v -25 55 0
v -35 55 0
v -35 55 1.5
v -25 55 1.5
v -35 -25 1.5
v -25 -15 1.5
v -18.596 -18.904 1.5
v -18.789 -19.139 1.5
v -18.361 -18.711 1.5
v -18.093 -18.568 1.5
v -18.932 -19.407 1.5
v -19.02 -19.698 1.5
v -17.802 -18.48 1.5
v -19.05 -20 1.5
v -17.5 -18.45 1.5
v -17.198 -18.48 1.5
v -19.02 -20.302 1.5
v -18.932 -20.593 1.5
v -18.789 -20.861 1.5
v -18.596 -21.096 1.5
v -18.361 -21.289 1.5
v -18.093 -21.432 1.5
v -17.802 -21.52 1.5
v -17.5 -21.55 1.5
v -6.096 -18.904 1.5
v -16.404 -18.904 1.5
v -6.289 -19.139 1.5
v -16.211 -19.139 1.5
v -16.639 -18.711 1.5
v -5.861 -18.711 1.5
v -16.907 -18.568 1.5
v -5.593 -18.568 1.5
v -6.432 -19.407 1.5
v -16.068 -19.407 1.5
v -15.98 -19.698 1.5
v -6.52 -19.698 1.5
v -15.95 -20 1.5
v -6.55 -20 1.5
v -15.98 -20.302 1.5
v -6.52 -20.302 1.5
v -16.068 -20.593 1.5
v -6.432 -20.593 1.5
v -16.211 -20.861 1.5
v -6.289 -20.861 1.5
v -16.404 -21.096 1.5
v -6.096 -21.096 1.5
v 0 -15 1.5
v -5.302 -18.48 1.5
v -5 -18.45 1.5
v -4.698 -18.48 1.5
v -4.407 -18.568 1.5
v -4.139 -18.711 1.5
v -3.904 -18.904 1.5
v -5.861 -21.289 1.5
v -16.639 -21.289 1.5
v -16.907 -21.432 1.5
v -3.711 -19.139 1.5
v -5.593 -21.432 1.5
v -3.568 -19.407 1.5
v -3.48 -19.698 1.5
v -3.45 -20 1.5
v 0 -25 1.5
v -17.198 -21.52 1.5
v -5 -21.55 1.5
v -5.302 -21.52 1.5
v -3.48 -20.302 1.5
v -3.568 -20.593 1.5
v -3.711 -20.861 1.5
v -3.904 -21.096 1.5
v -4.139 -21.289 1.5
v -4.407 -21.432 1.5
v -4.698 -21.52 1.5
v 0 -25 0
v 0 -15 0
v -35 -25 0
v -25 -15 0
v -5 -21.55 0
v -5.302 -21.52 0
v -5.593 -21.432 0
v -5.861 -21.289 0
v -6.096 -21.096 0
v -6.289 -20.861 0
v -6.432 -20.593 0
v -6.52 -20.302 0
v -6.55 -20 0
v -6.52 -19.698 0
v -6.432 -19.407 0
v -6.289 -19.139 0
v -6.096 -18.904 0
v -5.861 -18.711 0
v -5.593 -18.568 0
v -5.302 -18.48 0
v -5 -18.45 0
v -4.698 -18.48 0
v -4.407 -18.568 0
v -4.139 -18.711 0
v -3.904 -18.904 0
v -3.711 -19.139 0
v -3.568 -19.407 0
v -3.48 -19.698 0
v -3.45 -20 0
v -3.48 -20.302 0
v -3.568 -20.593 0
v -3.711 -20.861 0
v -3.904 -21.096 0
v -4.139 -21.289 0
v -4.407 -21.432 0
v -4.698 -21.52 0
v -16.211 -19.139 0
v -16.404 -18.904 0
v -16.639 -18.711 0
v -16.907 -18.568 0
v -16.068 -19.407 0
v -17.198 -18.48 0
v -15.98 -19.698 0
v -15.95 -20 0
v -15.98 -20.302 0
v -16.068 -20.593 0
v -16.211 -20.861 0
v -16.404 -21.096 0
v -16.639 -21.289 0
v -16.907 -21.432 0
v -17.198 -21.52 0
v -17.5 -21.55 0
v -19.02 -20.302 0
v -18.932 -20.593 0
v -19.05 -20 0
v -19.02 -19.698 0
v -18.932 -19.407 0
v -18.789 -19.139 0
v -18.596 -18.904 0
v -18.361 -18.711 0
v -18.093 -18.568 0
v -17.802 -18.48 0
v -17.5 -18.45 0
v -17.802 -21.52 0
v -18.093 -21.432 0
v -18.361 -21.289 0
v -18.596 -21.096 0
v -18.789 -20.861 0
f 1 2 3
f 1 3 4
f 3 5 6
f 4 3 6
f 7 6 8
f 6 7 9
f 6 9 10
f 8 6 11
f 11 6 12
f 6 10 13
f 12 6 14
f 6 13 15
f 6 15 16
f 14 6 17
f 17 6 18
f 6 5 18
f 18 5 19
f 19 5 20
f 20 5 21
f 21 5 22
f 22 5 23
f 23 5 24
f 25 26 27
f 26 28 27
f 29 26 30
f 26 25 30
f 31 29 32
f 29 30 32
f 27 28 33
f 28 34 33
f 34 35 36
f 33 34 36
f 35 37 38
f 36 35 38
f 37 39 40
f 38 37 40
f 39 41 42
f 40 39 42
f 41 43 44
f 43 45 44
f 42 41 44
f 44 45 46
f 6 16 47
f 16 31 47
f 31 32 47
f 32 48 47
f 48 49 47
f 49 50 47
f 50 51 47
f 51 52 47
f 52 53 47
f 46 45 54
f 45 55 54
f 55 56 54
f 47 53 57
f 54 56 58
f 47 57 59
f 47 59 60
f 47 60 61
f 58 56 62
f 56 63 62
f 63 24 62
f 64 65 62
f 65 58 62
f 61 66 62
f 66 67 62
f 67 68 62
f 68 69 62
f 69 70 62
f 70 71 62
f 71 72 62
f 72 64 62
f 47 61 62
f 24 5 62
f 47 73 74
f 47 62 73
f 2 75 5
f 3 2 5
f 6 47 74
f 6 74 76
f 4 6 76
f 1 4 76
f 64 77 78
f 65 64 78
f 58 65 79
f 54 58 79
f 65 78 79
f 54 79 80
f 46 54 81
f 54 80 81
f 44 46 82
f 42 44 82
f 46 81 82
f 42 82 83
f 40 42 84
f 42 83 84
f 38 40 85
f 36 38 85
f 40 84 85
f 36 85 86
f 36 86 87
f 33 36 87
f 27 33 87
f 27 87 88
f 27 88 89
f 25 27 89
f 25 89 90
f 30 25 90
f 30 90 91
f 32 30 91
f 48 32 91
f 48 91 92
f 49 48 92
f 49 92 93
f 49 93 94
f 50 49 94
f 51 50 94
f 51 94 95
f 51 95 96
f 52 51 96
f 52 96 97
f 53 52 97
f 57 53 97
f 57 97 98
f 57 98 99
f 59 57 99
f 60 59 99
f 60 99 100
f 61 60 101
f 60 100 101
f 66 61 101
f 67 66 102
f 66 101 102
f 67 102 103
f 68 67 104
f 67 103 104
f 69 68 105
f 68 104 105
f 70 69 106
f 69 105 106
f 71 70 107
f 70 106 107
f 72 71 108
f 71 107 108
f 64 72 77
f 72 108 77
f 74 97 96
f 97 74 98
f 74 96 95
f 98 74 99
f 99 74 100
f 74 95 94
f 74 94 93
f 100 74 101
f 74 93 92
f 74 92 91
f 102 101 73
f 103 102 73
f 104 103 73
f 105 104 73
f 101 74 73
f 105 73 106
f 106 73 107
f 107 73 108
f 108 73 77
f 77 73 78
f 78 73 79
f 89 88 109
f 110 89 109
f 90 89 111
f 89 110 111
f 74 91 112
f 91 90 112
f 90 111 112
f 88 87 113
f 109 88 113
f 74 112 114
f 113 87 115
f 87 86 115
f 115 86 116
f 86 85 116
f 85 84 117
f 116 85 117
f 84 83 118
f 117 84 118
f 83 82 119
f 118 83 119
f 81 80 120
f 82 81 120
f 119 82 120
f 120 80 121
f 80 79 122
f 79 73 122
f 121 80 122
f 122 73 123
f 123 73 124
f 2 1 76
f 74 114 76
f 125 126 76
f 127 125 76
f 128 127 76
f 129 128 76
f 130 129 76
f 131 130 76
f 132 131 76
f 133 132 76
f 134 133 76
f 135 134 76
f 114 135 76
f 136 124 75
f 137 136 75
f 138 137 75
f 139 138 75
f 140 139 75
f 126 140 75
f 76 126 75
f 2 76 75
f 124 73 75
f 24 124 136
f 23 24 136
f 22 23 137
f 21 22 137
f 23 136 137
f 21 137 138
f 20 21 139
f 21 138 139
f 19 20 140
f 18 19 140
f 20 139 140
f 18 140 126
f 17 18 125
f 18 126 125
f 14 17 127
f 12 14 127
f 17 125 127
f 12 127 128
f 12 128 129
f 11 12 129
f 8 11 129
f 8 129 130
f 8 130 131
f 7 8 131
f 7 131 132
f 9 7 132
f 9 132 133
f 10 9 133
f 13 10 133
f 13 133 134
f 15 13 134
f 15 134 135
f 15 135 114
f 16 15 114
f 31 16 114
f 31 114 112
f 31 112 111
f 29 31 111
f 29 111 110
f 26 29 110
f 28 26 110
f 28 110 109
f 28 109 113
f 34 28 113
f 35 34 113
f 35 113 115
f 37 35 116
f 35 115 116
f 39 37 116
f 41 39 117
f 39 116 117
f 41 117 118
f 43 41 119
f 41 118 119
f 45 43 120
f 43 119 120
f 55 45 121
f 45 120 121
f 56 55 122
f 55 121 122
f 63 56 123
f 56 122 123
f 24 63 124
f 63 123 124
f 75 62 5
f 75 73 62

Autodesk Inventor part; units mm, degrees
ref_plane "YZ Plane" through (0, 0, 0) normal (1, 0, 0) x (0, 1, 0)
ref_plane "XZ Plane" through (0, 0, 0) normal (0, 1, 0) x (-1, 0, 0)
ref_plane "XY Plane" through (0, 0, 0) normal (0, 0, 1) x (1, 0, 0)
sketch "スケッチ1" plane through (0, 0, 0) normal (0, 0, 1) x (1, 0, 0)
  line L0 (-35, 25) -> (35, 25)
  line L1 (35, 25) -> (35, -25)
  line L2 (35, -25) -> (-35, -25)
  line L3 (-35, -25) -> (-35, 25)
  line L4 (-35, 25) -> (35, -25) construction
  line L5 (35, 25) -> (-35, -25) construction
  point P0 (0, 0)
  dimension "d0" = 70
  dimension "d1" = 50
extrude "押し出し1" add sketch "スケッチ1" along normal blind 1.5
sketch "スケッチ2" plane through (0, 0, 1.5) normal (0, 0, 1) x (1, 0, 0)
  line L0 (-25, 25) -> (25, 25)
  line L1 (25, 25) -> (25, -15)
  line L2 (25, -15) -> (-25, -15)
  line L3 (-25, -15) -> (-25, 25)
  line L4 (-35, 25) -> (-35, -25) projected
  line L5 (35, -25) -> (35, 25) projected
  line L6 (-35, -25) -> (35, -25) projected
  point P0 (0, 0)
  dimension "d4" = 10
  dimension "d5" = 10
  dimension "d6" = 10
extrude "押し出し2" cut sketch "スケッチ2" against normal blind 1.5
sketch "スケッチ3" plane through (0, 0, 1.5) normal (0, 0, 1) x (1, 0, 0)
  line L0 (35, -25) -> (35, 25) projected
  line L1 (-35, 25) -> (-35, -25) projected
  line L2 (25, -15) -> (-25, -15) projected
  point P0 (0, 0)
  point P1 (-17.5, -20)
  point P2 (17.5, -20)
  dimension "d9" = 17.5
  dimension "d10" = 17.5
  dimension "d11" = 5
hole "穴1" at (-17.5, -20, 1.5) at (17.5, -20, 1.5) direction (0, 0, -1) diameter 3.1 end through all
sketch "スケッチ5" plane through (0, 0, 1.5) normal (0, 0, 1) x (1, 0, 0)
  line L0 (-35, -25) -> (35, -25) projected
  line L1 (-35, 25) -> (-35, -25) projected
  point P0 (0, 0)
  point P1 (-5, -20)
  point P2 (5, -20)
  point P3 (-35, 55)
  dimension "d21" = 10
  dimension "d22" = 5
  dimension "d23" = 30
hole "穴2" at (-5, -20, 1.5) at (5, -20, 1.5) direction (0, 0, -1) diameter 3.1 end through all
sketch "スケッチ6" plane through (0, 0, 1.5) normal (0, 0, 1) x (1, 0, 0)
  line L0 (0, 82.7836) -> (64.7866, 82.7836)
  line L1 (64.7866, 82.7836) -> (64.7866, -43.11)
  line L2 (64.7866, -43.11) -> (0, -43.11)
  line L3 (0, -43.11) -> (0, 82.7836)
  point P0 (0, 0)
extrude "押し出し4" cut sketch "スケッチ6" against normal blind 30
sketch "スケッチ7" plane through (-35, 25, 1.5) normal (0, 1, 0) x (1, 0, 0)
  line L0 (0, 0) -> (10, 0)
  line L1 (10, 0) -> (10, 1.5)
  line L2 (10, 1.5) -> (0, 1.5)
  line L3 (0, 1.5) -> (0, 0)
  point P0 (35, 1.5)
extrude "押し出し5" add sketch "スケッチ7" along normal blind 30
properties part number "爪_4" material "アルミニウム 6061"
